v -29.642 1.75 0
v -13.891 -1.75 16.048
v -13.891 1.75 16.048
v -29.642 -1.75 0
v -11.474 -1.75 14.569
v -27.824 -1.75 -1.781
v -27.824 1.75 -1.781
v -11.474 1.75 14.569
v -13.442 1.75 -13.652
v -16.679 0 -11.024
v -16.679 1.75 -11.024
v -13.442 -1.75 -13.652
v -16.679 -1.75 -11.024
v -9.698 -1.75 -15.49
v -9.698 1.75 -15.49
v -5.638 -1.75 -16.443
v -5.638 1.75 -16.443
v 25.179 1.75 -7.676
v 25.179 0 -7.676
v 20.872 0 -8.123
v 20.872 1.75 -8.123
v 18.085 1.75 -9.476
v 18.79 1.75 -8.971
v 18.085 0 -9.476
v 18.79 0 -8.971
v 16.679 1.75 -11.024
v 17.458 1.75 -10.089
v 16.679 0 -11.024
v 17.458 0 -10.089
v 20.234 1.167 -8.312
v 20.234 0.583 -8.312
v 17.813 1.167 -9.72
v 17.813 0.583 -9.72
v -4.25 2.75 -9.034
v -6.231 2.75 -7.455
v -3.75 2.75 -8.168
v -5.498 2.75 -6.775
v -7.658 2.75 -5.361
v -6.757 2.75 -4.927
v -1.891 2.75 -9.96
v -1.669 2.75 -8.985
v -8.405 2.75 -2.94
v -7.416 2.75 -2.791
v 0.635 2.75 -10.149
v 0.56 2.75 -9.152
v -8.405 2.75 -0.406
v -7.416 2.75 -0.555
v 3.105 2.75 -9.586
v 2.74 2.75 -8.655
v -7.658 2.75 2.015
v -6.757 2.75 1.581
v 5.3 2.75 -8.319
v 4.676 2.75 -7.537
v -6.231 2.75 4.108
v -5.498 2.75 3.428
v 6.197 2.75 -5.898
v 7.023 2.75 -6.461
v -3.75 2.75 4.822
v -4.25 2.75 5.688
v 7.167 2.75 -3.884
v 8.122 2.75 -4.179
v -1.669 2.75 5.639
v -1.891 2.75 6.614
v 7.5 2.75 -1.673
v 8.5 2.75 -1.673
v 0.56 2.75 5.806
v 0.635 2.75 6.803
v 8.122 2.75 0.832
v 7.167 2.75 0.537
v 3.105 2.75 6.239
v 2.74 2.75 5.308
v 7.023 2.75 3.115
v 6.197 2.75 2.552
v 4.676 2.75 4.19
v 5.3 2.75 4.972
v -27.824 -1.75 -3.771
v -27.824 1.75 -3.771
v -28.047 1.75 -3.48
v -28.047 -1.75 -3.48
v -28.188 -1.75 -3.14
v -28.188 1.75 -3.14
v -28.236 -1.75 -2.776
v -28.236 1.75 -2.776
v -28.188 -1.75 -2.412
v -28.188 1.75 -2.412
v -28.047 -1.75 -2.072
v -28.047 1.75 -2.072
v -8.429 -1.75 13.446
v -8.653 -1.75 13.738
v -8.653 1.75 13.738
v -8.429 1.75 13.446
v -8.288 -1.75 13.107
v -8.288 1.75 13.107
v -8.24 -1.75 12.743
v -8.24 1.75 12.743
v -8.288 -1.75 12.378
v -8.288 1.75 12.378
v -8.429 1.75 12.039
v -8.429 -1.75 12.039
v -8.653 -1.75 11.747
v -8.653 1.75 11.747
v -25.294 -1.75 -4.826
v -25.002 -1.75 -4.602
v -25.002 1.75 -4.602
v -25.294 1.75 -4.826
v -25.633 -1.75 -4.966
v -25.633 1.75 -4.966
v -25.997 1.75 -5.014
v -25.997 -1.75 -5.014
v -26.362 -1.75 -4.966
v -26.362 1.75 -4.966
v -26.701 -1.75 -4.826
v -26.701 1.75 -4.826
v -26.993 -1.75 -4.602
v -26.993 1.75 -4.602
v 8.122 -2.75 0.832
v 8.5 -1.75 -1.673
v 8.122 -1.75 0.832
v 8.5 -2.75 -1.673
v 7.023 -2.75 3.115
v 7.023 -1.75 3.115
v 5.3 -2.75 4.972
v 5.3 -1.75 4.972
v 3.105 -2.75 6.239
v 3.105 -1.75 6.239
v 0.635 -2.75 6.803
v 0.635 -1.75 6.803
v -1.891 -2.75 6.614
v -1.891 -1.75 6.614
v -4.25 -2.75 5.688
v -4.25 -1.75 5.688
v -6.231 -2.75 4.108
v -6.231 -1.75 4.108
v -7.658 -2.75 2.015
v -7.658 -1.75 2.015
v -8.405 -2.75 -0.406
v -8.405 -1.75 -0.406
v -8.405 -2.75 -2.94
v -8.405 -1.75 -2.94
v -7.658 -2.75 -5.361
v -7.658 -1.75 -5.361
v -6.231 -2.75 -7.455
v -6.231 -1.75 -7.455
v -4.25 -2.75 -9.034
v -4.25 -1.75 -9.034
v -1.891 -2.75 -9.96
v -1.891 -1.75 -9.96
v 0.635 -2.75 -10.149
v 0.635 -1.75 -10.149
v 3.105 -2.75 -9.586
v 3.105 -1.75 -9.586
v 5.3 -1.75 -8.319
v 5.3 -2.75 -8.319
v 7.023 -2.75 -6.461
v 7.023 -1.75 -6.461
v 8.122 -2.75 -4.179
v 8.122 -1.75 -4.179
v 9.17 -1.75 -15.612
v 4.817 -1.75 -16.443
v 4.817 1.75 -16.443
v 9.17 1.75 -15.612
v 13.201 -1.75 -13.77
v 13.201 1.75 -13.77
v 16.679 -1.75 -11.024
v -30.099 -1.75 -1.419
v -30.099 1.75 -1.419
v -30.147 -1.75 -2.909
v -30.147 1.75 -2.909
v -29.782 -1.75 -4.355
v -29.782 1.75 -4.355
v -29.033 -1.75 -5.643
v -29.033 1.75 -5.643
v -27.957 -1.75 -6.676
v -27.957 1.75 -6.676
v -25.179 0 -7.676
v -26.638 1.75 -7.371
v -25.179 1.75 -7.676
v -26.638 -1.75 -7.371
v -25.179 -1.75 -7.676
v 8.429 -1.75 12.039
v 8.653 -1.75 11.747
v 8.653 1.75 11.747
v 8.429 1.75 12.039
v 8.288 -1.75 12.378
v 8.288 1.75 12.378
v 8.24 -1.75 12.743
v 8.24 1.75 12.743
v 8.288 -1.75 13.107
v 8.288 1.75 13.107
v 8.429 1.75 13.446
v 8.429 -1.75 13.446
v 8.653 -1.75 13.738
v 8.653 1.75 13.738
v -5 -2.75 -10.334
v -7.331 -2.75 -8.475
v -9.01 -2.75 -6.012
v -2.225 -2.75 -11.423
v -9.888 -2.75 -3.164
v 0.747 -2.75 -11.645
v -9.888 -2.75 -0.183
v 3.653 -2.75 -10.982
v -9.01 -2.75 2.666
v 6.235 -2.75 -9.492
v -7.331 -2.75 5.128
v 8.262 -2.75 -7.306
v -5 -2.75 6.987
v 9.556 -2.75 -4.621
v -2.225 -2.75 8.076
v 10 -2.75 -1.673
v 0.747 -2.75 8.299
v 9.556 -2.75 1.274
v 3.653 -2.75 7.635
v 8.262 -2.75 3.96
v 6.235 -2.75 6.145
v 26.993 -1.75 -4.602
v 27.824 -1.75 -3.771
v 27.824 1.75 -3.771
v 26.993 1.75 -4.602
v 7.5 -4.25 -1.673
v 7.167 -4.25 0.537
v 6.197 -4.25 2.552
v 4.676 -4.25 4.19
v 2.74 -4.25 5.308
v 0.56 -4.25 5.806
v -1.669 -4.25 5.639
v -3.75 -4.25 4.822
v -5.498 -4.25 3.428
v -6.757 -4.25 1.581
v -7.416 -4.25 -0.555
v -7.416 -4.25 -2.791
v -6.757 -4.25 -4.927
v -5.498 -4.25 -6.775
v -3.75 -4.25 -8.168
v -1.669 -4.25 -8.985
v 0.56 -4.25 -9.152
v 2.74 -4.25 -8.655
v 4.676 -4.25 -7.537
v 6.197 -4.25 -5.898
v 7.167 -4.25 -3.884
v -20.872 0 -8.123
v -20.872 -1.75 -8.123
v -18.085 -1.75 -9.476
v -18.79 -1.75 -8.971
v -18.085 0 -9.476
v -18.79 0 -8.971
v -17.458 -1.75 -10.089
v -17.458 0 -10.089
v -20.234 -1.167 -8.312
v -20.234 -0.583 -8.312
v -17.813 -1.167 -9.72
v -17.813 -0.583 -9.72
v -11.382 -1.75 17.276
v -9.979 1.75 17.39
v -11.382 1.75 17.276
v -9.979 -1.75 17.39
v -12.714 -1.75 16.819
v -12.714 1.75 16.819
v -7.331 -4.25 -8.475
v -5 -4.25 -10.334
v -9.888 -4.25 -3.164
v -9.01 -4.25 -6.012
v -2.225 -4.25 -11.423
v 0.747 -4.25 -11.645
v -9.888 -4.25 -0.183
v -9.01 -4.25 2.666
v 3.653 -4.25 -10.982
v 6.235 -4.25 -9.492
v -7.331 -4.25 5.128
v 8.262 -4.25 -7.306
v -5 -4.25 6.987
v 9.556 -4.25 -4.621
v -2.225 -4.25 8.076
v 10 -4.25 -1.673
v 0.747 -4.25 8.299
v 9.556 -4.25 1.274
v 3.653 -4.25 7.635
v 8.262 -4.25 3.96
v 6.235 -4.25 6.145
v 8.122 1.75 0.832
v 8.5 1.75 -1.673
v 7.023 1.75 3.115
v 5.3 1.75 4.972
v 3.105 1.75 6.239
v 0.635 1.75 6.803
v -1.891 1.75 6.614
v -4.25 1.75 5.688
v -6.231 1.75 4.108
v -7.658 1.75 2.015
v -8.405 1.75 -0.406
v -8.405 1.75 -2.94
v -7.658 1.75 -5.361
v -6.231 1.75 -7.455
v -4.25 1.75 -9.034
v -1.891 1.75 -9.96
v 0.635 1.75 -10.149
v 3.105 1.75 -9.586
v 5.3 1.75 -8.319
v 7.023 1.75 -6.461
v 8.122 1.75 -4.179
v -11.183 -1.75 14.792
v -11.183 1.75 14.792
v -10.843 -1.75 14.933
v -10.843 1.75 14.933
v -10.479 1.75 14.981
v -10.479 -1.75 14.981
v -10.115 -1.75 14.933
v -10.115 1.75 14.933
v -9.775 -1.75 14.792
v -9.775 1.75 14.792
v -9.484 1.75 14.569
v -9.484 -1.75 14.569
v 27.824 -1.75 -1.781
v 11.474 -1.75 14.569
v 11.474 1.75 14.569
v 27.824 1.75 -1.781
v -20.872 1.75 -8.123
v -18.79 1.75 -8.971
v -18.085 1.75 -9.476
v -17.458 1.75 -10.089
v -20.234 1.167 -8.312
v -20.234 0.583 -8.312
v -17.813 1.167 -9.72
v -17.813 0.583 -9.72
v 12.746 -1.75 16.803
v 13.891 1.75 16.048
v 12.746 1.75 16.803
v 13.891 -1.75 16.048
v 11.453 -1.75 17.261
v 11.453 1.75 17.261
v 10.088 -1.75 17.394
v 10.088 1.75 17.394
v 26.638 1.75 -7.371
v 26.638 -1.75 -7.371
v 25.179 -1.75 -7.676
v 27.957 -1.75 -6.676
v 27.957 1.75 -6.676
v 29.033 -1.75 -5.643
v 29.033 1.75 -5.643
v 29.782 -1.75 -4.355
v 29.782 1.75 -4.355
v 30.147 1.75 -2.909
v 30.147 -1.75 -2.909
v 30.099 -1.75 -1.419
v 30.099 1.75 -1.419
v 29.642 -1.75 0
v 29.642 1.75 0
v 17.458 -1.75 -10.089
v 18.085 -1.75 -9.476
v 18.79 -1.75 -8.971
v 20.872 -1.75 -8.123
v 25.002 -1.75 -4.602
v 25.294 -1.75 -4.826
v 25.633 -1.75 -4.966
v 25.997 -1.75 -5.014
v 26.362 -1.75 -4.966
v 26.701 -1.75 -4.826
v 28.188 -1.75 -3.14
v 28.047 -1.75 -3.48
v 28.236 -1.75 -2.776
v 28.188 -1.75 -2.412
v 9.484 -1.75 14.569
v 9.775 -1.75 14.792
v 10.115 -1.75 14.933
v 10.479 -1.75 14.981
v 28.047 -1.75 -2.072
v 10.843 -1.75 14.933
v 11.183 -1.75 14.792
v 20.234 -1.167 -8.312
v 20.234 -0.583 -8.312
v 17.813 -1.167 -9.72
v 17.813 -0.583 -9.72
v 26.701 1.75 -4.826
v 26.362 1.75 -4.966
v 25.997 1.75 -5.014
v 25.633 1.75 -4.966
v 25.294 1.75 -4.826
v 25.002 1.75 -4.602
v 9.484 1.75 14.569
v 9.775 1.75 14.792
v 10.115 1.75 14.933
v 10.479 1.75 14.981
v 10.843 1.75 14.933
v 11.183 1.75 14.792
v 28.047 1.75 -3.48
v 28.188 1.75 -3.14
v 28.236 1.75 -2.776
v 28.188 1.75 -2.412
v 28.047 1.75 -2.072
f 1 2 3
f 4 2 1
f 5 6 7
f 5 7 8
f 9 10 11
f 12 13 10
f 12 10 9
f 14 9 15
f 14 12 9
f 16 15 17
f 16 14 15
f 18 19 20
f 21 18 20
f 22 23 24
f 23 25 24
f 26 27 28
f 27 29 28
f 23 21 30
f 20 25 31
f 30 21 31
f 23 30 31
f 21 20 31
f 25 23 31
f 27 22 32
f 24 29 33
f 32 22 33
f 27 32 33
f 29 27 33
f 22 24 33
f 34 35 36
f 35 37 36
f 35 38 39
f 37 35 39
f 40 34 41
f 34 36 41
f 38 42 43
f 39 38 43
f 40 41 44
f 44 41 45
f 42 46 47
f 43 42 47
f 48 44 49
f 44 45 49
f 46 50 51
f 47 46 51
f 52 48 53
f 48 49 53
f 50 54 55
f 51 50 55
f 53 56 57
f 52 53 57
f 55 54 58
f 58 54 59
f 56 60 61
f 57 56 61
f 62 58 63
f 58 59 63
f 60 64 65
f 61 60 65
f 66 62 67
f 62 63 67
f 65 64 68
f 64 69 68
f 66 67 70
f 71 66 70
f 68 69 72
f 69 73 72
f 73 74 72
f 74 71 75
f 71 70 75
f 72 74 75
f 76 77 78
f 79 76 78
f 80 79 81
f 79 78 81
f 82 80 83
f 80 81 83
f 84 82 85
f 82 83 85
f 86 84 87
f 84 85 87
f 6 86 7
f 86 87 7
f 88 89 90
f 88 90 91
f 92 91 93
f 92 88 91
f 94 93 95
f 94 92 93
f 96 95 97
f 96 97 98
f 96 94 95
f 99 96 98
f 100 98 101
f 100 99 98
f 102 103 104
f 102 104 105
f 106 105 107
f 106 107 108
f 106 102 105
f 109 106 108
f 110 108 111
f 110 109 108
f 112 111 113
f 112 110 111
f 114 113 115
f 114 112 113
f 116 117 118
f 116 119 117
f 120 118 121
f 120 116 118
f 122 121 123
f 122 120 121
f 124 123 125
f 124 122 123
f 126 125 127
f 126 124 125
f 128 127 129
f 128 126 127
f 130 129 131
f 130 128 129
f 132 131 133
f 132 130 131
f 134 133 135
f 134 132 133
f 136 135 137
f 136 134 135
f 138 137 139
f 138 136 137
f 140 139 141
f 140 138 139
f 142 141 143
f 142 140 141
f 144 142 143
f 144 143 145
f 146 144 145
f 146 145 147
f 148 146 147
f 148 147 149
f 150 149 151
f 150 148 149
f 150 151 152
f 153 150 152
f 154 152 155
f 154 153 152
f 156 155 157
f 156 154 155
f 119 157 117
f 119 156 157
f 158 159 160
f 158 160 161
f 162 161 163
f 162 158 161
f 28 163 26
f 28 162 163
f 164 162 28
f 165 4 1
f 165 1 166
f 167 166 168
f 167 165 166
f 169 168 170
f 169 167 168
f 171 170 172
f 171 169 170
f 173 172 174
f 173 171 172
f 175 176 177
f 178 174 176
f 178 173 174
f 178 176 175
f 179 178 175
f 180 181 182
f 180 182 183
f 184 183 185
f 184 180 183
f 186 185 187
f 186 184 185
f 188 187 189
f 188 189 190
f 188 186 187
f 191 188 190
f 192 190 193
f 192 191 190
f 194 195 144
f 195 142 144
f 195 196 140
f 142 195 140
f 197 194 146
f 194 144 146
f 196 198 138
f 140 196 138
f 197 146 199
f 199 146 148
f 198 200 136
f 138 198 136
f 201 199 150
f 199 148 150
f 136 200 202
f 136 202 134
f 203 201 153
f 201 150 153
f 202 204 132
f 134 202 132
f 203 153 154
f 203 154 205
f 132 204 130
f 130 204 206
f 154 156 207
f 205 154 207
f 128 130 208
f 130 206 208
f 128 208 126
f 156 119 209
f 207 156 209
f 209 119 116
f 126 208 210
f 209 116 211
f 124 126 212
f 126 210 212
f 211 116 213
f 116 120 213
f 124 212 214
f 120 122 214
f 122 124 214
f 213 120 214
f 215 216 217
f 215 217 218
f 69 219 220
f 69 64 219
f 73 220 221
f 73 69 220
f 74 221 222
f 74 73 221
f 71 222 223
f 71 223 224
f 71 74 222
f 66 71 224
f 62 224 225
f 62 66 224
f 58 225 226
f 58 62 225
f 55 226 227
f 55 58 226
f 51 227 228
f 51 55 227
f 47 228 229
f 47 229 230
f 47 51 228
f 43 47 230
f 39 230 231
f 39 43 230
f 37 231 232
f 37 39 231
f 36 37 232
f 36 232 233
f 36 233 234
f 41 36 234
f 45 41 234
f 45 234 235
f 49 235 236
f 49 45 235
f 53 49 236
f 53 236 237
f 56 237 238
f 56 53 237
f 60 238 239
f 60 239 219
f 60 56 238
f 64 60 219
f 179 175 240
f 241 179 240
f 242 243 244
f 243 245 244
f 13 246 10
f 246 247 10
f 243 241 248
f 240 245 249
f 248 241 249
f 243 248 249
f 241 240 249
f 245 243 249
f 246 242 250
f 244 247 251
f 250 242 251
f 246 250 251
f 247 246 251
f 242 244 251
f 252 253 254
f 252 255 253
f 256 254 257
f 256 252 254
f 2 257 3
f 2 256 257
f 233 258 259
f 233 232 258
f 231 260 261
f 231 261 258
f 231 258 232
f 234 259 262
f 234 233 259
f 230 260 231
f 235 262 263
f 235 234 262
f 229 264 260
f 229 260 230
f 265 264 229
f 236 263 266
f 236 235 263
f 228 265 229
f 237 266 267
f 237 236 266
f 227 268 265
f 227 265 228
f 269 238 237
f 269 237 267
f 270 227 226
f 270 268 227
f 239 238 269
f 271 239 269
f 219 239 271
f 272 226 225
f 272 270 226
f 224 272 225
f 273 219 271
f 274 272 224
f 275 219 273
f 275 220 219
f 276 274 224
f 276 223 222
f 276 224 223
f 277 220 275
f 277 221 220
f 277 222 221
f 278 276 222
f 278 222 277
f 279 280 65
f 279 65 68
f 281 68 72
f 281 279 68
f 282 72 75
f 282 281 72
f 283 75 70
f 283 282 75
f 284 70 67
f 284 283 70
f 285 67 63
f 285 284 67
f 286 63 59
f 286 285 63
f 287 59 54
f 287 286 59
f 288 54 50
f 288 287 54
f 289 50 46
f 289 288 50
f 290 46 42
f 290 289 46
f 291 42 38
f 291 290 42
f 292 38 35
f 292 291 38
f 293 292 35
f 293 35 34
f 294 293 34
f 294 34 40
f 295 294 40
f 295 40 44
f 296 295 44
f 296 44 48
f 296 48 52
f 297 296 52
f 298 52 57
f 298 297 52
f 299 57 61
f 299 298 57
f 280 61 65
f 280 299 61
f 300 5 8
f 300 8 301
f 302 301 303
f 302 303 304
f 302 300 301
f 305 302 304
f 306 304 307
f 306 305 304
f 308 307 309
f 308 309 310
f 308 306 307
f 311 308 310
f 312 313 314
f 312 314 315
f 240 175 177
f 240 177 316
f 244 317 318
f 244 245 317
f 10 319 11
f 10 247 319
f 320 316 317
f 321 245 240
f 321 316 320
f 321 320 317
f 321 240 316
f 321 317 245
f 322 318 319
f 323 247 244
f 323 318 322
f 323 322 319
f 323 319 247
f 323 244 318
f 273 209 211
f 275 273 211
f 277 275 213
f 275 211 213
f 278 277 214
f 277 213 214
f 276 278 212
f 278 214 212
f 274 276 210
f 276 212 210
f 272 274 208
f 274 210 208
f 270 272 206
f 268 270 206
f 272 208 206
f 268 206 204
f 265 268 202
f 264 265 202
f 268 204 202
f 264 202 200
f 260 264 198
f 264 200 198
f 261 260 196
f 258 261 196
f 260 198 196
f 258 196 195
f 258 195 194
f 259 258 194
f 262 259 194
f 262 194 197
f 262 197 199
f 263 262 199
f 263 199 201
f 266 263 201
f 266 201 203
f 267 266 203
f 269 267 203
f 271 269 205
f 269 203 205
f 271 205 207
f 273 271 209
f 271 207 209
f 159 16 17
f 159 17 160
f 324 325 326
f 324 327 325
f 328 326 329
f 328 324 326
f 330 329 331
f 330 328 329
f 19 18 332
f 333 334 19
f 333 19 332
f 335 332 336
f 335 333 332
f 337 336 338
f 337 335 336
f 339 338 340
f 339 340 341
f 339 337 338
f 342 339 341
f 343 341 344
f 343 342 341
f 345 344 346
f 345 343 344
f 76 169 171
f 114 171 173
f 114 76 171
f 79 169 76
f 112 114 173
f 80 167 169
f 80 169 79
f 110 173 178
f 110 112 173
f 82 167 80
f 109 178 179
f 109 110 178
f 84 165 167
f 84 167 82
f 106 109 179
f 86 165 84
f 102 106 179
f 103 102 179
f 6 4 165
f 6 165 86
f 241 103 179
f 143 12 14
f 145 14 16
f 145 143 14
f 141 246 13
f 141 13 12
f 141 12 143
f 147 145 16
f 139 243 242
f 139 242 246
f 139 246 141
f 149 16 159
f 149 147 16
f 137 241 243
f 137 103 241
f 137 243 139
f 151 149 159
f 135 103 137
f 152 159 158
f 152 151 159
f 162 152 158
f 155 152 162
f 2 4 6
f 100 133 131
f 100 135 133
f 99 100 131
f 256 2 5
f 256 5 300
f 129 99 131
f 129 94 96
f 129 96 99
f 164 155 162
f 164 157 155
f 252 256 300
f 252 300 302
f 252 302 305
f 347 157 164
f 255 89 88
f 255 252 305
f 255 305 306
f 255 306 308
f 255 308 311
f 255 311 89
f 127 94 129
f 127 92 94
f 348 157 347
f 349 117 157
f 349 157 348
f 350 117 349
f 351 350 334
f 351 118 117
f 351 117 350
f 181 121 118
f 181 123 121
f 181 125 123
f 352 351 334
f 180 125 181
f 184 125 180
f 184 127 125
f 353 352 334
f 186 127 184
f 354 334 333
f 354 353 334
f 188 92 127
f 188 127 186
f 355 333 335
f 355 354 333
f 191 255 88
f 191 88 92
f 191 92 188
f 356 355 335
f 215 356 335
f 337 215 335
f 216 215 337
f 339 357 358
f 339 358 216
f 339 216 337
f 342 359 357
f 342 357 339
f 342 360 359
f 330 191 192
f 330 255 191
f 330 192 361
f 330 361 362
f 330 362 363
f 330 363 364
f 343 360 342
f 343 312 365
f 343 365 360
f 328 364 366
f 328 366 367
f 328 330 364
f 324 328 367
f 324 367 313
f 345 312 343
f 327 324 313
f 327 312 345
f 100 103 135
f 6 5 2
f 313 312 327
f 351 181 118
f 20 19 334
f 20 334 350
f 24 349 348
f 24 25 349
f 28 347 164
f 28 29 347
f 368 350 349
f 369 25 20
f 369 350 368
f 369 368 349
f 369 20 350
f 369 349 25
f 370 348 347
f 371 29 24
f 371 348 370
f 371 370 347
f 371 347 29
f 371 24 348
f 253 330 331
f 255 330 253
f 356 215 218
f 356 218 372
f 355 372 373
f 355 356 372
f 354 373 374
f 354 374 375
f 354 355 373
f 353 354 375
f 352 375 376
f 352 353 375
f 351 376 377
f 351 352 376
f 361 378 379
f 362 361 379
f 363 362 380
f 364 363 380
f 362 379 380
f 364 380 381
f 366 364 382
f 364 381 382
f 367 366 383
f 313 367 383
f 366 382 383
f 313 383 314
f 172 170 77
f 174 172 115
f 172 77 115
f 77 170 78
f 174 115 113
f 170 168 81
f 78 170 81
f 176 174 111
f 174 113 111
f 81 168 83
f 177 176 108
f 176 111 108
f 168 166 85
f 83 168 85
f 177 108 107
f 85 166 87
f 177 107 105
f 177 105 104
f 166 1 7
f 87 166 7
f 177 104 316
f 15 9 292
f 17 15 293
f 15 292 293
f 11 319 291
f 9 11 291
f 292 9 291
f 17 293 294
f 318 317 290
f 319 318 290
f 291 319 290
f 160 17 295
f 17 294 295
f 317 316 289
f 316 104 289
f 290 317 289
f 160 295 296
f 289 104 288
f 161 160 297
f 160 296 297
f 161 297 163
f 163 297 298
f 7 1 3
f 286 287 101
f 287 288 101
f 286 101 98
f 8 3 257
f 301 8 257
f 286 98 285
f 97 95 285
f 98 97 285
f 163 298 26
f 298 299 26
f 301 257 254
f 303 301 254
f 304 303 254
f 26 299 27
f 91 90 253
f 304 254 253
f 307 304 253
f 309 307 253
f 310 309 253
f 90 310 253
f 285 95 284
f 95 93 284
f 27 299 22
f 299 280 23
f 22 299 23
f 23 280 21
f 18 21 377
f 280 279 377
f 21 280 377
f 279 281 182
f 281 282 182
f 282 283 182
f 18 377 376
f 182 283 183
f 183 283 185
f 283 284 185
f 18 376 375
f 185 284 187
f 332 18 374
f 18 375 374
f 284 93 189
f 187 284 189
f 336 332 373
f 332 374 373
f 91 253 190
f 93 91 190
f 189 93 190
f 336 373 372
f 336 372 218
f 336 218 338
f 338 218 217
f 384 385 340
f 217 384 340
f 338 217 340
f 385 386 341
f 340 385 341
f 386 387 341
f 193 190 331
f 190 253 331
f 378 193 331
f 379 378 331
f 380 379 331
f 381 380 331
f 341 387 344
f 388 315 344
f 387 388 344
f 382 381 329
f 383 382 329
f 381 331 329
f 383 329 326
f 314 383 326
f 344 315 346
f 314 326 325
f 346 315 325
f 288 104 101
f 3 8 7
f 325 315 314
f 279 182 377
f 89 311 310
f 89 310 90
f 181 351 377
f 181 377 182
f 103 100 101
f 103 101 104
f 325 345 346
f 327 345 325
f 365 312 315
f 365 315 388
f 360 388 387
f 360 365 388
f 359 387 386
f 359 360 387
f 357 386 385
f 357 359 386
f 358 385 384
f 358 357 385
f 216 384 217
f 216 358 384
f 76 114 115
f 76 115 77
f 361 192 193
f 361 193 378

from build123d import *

# Parameters (mm, degrees)
F0_R     = 7.5
F1_DEPTH = 1.75
F2_R     = 8.5
F2_R_2   = 7.5
F3_DEPTH = 2.75
F4_R     = 10
F4_R_2   = 7.5
F5_DEPTH = 1.5


with BuildPart() as f1:
    # F0 (on Front) → F1 (new body, symmetric)
    with BuildSketch(Plane.XZ):
        with BuildLine():
            Line((-13.891386, 16.048208), (-29.641638, 0))
            ThreePointArc((-29.641638, 0), (-29.452592, -5.025263), (-25.179131, -7.676025))
            add(Edge.make_bspline(
                [(-25.179131, -7.676025), (-18.558836, -7.633325), (-17.581457, -10.063985), (-16.679482, -11.024288)],
                knots=[0, 0, 0, 0, 9.135366, 9.135366, 9.135366, 9.135366], degree=3))
            ThreePointArc((-16.679482, -11.024288), (-11.621852, -14.676658), (-5.63849, -16.44267))
            Line((-5.63849, -16.44267), (4.816984, -16.44267))
            ThreePointArc((4.816984, -16.44267), (11.240893, -14.812063), (16.679482, -11.024288))
            add(Edge.make_bspline(
                [(25.179131, -7.676025), (18.558836, -7.633325), (17.581457, -10.063985), (16.679482, -11.024288)],
                knots=[0, 0, 0, 0, 9.135366, 9.135366, 9.135366, 9.135366], degree=3))
            ThreePointArc((25.179131, -7.676025), (29.452592, -5.025263), (29.641638, 0))
            Line((29.641638, 0), (13.891386, 16.048208))
            ThreePointArc((13.891386, 16.048208), (12.113511, 17.071286), (10.087852, 17.394136))
            Line((10.087852, 17.394136), (-9.978892, 17.39047))
            ThreePointArc((-9.978892, 17.39047), (-12.062035, 17.089223), (-13.891386, 16.048208))
        make_face()
        with Locations((0, -1.673267)):
            Circle(F0_R, mode=Mode.SUBTRACT)
        with BuildLine():
            Line((-8.652875, 11.747209), (-25.002061, -4.602077))
            ThreePointArc((-25.002061, -4.602077), (-25.997431, -5.014338), (-26.992801, -4.602077))
            Line((-26.992801, -4.602077), (-27.823672, -3.771305))
            ThreePointArc((-27.823672, -3.771305), (-28.235982, -2.775914), (-27.823572, -1.780565))
            Line((-27.823572, -1.780565), (-11.474387, 14.56872))
            ThreePointArc((-11.474387, 14.56872), (-10.479017, 14.980981), (-9.483647, 14.56872))
            Line((-9.483647, 14.56872), (-8.652775, 13.737948))
            ThreePointArc((-8.652775, 13.737948), (-8.240465, 12.742558), (-8.652875, 11.747209))
        make_face(mode=Mode.SUBTRACT)
        with BuildLine():
            ThreePointArc((9.483647, 14.56872), (10.479017, 14.980981), (11.474387, 14.56872))
            Line((11.474387, 14.56872), (27.823572, -1.780565))
            ThreePointArc((27.823572, -1.780565), (28.235982, -2.775914), (27.823672, -3.771305))
            Line((27.823672, -3.771305), (26.992801, -4.602077))
            ThreePointArc((26.992801, -4.602077), (25.997431, -5.014338), (25.002061, -4.602077))
            Line((25.002061, -4.602077), (8.652875, 11.747209))
            ThreePointArc((8.652875, 11.747209), (8.240465, 12.742558), (8.652775, 13.737948))
            Line((8.652775, 13.737948), (9.483647, 14.56872))
        make_face(mode=Mode.SUBTRACT)
    extrude(amount=F1_DEPTH, both=True)

    # F2 (on Front) → F3 (join, symmetric)
    with BuildSketch(Plane.XZ):
        with Locations((0, -1.673267)):
            Circle(F2_R)
        with Locations((0, -1.673267)):
            Circle(F2_R_2, mode=Mode.SUBTRACT)
    extrude(amount=F3_DEPTH, both=True)

    # F4 (on face) → F5 (join)
    with BuildSketch(Plane.XZ.offset(2.75)):
        with Locations((0, -1.673267)):
            Circle(F4_R)
        with Locations((0, -1.673267)):
            Circle(F4_R_2, mode=Mode.SUBTRACT)
    extrude(amount=F5_DEPTH)


solid = f1.part
